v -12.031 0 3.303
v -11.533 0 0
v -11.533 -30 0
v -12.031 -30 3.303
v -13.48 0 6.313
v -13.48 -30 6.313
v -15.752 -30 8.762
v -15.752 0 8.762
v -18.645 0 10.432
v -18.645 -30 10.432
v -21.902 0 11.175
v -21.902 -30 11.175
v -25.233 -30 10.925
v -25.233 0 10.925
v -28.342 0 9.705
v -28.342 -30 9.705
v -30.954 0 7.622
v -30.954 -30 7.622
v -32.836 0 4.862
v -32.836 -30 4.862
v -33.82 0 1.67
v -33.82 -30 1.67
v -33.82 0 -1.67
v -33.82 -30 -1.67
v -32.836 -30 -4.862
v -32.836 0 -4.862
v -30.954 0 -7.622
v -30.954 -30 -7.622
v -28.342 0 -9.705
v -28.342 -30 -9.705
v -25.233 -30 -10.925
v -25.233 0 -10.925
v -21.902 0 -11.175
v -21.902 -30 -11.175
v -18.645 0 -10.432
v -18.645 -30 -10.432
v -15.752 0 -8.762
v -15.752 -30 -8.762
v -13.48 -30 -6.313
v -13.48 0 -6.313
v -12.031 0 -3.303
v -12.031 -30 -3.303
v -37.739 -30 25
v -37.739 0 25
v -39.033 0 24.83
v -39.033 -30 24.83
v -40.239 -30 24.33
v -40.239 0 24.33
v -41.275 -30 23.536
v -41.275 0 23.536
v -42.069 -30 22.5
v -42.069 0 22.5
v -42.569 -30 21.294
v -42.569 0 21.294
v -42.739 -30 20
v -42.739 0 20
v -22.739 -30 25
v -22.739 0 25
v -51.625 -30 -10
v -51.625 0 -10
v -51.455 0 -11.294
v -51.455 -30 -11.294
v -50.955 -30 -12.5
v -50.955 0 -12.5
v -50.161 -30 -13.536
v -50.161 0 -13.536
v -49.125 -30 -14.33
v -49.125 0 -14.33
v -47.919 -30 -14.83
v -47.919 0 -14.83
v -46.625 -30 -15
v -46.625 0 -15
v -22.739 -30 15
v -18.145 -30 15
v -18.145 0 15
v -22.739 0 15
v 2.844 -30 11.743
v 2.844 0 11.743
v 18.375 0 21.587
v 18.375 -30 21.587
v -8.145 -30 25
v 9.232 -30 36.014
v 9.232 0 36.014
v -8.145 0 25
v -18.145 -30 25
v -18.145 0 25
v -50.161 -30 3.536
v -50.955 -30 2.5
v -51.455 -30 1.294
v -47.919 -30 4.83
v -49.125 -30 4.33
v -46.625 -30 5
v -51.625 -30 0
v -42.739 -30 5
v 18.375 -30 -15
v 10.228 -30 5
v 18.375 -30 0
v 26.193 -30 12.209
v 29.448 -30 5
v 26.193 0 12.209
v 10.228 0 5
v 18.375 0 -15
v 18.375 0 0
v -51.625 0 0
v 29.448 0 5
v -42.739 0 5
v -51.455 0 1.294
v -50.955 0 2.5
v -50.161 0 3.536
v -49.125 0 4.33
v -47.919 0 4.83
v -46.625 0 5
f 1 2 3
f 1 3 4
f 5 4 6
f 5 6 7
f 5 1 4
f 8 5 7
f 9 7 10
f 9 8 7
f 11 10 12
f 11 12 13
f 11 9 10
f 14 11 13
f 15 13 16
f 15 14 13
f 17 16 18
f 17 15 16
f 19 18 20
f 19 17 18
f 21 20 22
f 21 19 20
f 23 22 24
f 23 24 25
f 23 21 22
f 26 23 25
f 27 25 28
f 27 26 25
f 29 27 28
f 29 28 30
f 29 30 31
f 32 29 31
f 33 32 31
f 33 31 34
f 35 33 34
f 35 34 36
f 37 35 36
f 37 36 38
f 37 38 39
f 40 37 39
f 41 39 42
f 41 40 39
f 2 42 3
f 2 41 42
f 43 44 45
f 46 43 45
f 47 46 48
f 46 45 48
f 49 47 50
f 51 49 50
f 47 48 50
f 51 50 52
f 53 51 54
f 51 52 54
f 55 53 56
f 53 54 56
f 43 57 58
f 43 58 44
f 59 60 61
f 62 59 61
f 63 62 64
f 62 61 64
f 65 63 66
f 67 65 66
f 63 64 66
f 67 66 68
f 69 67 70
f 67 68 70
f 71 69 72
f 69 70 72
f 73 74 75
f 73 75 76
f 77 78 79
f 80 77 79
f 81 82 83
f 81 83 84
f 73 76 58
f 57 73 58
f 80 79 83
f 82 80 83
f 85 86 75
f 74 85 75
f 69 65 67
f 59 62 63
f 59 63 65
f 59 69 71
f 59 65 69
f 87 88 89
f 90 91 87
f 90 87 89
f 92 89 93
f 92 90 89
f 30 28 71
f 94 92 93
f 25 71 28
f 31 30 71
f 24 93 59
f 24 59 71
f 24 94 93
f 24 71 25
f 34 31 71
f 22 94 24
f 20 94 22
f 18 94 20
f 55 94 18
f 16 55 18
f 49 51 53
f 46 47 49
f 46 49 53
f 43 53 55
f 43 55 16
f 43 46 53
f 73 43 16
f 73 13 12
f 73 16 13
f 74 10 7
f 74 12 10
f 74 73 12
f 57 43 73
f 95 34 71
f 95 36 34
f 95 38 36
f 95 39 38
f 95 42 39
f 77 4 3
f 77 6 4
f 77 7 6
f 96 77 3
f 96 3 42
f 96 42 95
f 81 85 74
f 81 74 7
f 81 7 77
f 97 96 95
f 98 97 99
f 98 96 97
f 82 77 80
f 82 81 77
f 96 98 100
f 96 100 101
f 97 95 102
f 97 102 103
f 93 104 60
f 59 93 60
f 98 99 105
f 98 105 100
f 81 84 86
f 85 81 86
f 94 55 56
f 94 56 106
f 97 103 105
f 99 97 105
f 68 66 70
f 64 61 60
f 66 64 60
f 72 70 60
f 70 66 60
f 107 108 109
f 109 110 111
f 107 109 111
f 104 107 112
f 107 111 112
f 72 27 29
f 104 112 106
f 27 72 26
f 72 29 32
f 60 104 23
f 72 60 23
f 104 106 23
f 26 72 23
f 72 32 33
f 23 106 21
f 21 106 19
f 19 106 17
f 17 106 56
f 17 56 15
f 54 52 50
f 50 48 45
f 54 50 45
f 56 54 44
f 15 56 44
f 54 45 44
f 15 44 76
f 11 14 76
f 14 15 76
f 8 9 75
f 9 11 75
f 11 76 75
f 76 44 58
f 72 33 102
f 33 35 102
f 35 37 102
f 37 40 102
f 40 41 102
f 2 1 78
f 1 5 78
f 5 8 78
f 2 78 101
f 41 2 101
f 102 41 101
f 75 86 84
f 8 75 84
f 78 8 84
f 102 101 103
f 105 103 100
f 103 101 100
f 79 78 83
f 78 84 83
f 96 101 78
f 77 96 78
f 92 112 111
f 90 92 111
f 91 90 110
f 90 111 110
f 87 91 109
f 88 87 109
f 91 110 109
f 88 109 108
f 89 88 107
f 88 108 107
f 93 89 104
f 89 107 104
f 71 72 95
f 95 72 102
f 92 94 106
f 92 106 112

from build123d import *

# Parameters (mm, degrees)
F0_R     = 11.20644
F1_DEPTH = 30


with BuildPart() as f1:
    # F0 (on Front) → F1 (new body)
    with BuildSketch(Plane.XZ):
        with BuildLine():
            Line((-46.625002, -15), (18.374998, -15))
            Line((18.374998, -15), (18.374998, 0))
            Line((18.374998, 0), (29.448327, 5))
            Line((29.448327, 5), (26.193243, 12.208923))
            Line((26.193243, 12.208923), (10.227887, 5))
            Line((10.227887, 5), (2.843751, 11.743481))
            Line((2.843751, 11.743481), (18.374998, 21.587231))
            Line((18.374998, 21.587231), (9.231542, 36.01357))
            Line((9.231542, 36.01357), (-8.145421, 25))
            Line((-8.145421, 25), (-18.145421, 25))
            Line((-18.145421, 25), (-18.145421, 15))
            Line((-18.145421, 15), (-22.739174, 15))
            Line((-22.739174, 15), (-22.739174, 25))
            Line((-22.739174, 25), (-37.739174, 25))
            ThreePointArc((-37.739174, 25), (-41.274708, 23.535534), (-42.739174, 20))
            Line((-42.739174, 20), (-42.739174, 5))
            Line((-42.739174, 5), (-46.625002, 5))
            ThreePointArc((-46.625002, 5), (-50.160536, 3.535534), (-51.625002, 0))
            Line((-51.625002, 0), (-51.625002, -10))
            ThreePointArc((-51.625002, -10), (-50.160536, -13.535534), (-46.625002, -15))
        make_face()
        with Locations((-22.739174, 0)):
            Circle(F0_R, mode=Mode.SUBTRACT)
    extrude(amount=F1_DEPTH)


solid = f1.part
